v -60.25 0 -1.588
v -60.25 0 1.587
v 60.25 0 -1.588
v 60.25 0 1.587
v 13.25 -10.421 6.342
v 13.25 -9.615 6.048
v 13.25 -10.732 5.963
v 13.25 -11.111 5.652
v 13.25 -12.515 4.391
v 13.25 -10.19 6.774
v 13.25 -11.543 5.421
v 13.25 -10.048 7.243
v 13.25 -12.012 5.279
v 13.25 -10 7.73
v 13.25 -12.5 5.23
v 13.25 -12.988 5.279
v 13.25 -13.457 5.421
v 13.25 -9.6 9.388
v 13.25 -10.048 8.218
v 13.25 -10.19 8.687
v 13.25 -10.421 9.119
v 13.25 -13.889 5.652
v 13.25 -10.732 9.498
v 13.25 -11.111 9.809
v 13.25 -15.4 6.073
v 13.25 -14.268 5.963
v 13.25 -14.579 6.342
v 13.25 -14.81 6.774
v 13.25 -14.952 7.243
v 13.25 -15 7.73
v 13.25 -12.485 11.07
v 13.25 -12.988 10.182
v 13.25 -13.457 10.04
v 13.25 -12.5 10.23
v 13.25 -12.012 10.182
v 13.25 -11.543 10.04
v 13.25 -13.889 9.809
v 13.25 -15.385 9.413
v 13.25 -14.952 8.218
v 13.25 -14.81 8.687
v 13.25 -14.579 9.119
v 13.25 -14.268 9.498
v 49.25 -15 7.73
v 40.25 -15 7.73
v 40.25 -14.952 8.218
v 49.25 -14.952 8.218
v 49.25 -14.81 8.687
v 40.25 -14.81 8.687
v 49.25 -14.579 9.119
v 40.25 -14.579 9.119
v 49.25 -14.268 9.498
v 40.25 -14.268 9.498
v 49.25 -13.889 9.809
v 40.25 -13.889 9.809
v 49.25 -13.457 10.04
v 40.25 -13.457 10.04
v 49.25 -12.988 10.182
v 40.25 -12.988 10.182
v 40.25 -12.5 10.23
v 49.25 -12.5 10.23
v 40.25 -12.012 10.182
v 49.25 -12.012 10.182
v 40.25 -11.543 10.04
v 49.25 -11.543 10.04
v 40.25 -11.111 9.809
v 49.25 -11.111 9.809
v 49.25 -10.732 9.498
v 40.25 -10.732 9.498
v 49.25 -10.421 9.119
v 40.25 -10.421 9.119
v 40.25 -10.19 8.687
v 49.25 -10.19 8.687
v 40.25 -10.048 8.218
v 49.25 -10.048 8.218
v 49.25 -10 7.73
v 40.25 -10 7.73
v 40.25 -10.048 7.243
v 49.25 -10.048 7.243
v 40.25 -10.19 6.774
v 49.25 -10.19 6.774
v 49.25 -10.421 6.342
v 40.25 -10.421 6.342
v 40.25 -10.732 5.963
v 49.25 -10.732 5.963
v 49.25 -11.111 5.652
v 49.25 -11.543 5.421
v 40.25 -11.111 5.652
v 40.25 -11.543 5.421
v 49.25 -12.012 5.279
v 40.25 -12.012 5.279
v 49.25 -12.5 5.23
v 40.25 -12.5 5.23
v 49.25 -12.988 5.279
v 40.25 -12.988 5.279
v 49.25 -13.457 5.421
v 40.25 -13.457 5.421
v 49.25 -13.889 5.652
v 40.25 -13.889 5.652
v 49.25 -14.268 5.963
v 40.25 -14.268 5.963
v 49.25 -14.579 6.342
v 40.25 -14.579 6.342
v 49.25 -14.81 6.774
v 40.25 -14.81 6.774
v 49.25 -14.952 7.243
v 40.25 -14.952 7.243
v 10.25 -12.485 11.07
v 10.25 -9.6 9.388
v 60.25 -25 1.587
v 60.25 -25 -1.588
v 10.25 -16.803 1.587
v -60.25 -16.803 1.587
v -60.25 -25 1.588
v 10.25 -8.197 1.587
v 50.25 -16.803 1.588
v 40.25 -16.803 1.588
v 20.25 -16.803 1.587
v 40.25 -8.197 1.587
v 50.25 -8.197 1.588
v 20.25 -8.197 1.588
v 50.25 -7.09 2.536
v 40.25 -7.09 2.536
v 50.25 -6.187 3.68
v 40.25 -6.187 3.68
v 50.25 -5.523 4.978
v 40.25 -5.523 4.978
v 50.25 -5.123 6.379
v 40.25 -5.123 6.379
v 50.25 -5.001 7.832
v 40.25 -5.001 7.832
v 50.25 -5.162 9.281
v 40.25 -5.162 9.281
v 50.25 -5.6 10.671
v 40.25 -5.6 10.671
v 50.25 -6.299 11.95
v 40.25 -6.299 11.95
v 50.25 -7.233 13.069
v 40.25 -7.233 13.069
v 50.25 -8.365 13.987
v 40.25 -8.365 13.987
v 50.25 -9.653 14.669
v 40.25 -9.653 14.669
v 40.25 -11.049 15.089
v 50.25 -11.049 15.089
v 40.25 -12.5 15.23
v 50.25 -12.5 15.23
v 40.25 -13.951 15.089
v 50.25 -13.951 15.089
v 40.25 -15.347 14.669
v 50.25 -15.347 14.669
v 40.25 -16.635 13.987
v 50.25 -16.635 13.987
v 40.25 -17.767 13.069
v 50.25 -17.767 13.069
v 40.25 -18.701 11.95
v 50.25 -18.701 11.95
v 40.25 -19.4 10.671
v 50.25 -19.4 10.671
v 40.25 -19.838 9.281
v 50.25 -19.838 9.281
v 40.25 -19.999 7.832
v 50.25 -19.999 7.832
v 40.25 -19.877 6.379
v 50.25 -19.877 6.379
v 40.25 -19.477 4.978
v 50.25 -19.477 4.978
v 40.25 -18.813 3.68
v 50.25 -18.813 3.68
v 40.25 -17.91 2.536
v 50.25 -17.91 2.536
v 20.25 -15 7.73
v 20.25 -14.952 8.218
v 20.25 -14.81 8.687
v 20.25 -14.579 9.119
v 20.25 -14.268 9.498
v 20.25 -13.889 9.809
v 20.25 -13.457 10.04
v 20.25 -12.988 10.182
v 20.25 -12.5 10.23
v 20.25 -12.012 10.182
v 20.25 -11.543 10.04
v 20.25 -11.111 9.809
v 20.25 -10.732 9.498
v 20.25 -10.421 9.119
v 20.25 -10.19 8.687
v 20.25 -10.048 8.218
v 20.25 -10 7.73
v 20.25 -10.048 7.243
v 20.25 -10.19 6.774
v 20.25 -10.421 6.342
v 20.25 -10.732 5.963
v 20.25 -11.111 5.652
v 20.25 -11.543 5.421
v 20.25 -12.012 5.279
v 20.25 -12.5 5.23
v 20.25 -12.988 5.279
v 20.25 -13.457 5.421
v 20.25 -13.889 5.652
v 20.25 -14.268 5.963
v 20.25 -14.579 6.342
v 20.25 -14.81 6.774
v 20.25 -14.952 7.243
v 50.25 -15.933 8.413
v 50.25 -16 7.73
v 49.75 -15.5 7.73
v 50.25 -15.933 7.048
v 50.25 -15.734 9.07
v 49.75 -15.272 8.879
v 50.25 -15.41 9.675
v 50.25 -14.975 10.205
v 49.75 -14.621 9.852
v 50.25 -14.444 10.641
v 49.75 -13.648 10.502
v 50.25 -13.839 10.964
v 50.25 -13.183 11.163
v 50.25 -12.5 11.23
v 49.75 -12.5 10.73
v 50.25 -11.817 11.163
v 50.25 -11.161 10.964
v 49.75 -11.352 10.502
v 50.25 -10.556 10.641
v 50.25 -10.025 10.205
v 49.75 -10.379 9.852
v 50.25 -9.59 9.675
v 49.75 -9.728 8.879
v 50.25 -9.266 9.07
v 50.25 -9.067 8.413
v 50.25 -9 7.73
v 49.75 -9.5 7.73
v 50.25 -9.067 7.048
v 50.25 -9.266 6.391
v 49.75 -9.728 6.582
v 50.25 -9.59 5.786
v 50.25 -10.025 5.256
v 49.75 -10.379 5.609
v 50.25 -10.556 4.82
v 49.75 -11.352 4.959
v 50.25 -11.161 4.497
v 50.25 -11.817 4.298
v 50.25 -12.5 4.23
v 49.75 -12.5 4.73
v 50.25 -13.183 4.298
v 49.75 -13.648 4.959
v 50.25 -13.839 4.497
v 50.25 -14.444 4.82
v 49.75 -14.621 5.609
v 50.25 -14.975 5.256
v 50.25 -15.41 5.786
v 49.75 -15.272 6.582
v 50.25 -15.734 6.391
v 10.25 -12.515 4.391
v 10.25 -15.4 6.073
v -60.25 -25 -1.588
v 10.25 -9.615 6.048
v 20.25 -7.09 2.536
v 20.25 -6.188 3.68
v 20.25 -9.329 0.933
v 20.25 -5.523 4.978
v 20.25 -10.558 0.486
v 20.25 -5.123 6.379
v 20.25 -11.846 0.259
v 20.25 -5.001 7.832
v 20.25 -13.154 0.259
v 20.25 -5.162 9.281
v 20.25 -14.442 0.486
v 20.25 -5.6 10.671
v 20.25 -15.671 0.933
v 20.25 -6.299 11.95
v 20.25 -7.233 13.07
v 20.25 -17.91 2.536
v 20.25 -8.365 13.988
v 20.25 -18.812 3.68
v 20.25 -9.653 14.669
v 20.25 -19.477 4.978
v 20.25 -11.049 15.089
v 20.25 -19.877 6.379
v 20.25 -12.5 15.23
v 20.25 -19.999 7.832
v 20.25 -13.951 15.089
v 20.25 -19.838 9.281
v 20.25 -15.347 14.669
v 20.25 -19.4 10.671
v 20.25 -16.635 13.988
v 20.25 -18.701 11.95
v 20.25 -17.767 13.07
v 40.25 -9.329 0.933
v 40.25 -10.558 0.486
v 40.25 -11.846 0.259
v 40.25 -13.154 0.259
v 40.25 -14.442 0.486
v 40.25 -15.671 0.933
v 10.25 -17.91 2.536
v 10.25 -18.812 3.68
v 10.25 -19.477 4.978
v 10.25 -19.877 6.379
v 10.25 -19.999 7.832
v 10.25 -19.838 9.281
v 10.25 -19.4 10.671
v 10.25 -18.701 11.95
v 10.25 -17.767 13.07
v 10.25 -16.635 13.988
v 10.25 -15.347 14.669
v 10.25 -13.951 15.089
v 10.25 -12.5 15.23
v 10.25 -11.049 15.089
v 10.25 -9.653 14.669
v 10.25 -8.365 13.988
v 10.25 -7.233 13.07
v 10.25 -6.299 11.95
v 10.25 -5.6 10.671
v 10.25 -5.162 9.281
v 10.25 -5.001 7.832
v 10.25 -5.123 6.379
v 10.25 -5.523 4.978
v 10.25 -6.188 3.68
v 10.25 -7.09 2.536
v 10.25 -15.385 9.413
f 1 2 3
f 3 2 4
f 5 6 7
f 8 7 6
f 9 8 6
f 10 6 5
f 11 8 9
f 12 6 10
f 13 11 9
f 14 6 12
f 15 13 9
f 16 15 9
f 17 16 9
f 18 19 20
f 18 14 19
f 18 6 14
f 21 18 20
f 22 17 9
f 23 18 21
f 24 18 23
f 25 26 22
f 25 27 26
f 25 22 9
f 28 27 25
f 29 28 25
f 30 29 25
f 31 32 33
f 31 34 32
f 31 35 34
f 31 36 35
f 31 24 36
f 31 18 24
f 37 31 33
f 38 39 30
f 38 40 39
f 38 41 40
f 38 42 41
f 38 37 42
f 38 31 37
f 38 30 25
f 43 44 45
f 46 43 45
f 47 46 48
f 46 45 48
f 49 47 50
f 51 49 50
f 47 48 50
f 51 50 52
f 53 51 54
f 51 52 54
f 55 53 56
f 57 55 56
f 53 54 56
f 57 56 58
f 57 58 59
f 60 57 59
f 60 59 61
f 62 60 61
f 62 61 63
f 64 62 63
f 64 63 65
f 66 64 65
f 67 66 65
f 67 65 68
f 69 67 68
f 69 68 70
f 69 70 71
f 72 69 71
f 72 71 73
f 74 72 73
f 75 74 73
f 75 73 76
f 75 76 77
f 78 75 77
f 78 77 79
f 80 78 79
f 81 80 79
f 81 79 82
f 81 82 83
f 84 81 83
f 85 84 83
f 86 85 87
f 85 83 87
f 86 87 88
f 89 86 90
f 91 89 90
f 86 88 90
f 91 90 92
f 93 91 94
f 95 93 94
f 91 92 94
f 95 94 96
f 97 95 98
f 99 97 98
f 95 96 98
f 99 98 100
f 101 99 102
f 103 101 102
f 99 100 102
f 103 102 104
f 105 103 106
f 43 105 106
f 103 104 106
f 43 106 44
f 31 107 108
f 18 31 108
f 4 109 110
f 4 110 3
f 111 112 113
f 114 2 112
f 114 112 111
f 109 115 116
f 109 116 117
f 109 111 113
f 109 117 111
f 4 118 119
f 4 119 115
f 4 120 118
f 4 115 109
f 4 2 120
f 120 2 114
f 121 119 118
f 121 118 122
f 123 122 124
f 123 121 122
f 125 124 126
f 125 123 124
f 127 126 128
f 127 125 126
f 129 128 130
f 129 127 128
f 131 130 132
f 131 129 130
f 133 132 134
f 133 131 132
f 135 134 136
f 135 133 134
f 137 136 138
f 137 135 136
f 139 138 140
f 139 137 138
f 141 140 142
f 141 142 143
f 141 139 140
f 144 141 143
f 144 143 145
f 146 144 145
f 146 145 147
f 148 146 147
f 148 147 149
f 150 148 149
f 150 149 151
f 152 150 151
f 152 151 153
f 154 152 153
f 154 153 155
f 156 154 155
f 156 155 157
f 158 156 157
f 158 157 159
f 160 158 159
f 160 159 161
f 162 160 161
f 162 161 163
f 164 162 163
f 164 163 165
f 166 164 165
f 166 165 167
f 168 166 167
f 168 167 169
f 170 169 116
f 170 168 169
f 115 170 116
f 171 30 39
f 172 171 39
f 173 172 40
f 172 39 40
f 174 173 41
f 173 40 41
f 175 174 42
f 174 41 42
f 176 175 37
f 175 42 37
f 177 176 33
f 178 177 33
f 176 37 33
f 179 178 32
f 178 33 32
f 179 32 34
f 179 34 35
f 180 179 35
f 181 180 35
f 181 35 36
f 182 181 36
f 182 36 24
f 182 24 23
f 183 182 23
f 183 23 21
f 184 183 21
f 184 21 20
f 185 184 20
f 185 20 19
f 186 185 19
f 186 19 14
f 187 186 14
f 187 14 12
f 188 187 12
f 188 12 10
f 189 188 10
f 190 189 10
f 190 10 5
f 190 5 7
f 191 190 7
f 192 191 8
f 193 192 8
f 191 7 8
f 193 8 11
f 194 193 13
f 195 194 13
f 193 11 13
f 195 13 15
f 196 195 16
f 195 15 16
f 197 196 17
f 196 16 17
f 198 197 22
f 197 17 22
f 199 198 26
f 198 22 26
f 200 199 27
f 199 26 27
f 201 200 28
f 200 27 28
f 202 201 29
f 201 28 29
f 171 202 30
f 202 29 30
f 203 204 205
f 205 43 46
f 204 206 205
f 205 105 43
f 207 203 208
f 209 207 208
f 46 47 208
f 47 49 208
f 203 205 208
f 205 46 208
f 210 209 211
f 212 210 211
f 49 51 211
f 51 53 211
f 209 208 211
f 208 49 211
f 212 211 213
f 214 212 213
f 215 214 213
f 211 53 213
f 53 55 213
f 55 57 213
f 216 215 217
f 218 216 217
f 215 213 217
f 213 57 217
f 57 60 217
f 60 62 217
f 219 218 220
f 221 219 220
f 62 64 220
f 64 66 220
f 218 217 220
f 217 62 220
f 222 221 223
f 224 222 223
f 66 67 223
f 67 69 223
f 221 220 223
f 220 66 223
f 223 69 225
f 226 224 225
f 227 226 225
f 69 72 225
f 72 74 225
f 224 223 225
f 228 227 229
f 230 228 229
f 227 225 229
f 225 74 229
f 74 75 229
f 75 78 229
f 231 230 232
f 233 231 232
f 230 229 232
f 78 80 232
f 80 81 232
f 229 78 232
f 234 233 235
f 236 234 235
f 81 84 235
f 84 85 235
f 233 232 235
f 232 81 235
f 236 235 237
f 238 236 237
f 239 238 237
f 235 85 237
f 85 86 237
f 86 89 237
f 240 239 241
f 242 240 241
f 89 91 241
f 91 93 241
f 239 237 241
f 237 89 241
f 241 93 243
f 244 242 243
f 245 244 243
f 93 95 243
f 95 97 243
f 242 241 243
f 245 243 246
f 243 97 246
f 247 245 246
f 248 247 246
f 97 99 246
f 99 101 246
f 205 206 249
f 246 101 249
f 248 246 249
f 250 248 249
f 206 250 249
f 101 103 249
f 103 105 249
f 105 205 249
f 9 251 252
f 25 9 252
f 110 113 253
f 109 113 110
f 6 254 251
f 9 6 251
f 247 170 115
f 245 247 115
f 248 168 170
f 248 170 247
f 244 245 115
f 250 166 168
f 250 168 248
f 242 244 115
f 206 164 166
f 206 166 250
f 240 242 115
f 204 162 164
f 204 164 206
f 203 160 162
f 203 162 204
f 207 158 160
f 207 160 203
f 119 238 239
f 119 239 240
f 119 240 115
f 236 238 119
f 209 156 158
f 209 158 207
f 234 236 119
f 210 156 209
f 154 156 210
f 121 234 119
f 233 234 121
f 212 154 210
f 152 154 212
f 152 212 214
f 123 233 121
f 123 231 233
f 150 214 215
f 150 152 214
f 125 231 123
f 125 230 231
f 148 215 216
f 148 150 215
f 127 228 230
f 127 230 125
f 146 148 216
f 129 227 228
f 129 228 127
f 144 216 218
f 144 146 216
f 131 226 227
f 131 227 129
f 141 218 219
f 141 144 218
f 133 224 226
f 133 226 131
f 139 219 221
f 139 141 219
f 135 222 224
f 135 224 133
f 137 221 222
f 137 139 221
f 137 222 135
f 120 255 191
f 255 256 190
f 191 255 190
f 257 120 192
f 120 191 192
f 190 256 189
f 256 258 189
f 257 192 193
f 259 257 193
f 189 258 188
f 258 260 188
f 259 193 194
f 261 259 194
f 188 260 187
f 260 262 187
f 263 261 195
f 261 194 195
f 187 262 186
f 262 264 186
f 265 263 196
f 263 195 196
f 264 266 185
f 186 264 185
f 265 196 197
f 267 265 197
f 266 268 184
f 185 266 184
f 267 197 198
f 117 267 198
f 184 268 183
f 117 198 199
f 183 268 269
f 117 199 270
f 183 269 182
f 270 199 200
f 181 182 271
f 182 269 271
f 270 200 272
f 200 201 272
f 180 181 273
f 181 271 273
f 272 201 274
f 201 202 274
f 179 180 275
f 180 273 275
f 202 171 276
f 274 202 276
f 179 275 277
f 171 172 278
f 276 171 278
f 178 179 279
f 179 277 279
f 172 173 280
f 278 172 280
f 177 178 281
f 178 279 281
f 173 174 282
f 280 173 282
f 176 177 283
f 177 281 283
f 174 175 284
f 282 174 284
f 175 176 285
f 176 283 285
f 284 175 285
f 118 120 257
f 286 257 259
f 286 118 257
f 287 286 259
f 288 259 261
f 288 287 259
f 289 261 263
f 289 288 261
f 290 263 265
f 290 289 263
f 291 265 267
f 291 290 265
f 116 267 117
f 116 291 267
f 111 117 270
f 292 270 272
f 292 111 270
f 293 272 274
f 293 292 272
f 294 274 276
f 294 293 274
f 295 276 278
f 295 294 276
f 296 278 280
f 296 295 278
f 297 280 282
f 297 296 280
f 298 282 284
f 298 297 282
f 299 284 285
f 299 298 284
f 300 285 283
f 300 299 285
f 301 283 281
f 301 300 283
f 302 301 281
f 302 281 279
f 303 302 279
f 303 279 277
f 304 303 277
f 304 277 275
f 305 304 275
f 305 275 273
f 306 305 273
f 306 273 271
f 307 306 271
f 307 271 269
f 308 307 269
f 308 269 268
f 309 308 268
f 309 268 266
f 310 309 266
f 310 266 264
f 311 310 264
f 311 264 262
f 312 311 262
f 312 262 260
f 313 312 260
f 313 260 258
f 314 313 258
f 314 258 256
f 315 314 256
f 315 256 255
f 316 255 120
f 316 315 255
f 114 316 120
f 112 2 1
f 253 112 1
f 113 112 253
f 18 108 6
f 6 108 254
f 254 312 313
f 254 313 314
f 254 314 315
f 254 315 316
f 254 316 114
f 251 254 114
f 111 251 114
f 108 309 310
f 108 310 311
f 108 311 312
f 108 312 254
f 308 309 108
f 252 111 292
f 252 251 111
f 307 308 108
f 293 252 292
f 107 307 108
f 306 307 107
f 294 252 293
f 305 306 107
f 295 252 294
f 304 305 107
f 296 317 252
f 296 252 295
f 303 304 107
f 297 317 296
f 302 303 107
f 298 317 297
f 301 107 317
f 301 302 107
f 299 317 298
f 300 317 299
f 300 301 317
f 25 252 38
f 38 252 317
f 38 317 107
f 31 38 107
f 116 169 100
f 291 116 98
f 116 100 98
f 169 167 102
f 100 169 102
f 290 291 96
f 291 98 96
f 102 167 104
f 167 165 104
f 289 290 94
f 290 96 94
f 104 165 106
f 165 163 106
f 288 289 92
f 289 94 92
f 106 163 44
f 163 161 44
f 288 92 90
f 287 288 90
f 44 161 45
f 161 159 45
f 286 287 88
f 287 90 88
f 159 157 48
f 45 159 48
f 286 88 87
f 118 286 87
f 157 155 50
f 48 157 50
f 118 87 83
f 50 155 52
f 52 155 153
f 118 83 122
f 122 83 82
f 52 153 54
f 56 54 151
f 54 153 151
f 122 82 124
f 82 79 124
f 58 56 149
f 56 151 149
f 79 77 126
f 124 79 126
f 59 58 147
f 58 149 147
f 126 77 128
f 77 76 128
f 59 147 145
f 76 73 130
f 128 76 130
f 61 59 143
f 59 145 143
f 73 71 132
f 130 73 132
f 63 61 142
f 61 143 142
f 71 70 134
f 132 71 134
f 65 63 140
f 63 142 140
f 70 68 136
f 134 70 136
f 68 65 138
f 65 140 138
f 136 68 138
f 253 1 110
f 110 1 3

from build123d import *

# Parameters (mm, degrees)
F0_W      = 120.5
F0_H      = 3.175
F1_DEPTH  = 25
F2_R      = 7.5
F3_DEPTH  = 20
F4_R      = 7.5
F5_DEPTH  = 20
F6_R      = 7.5
F7_DEPTH  = 80.5
F8_W      = 26.1427015066
F8_H      = 14.1189814121
F9_DEPTH  = 70.5
F10_W     = 25
F10_H     = 14.862489751
F11_DEPTH = 10
F12_R     = 2.5
F13_DEPTH = 80
F15_DEPTH = 3
F16_SIZE  = 1


# Not quite as in the source:
# - a feature names something its author has since deleted; it is built from what else it names


with BuildPart() as f1:
    # F0 (on Front) → F1 (new body)
    with BuildSketch(Plane.XZ):
        Rectangle(F0_W, F0_H)
    extrude(amount=F1_DEPTH)

    # F2 (on face) → F3 (join)
    with BuildSketch(Plane.YZ.offset(60.25)):
        with Locations((-12.5, 7.7303019352)):
            Circle(F2_R)
    extrude(amount=-F3_DEPTH)

    # F4 (on face) → F5 (cut)
    with BuildSketch(Plane(origin=(40.25, 0, 0), x_dir=(0, -1, 0), z_dir=(-1, 0, 0))):
        with Locations((12.5, 7.7303019352)):
            Circle(F4_R)
    extrude(amount=F5_DEPTH, mode=Mode.SUBTRACT)

    # F6 (on face) → F7 (join)
    with BuildSketch(Plane(origin=(-60.25, 0, 0), x_dir=(0, -1, 0), z_dir=(-1, 0, 0))):
        with Locations((12.5, 7.7305)):
            Circle(F6_R)
    extrude(amount=-F7_DEPTH)

    # F8 (on face) → F9 (cut)
    with BuildSketch(Plane(origin=(-60.25, 0, 0), x_dir=(0, -1, 0), z_dir=(-1, 0, 0))):
        with Locations((13.0713507533, 8.646990706)):
            Rectangle(F8_W, F8_H)
    extrude(amount=-F9_DEPTH, mode=Mode.SUBTRACT)

    # F10 (on face) → F11 (cut)
    with BuildSketch(Plane.YZ.offset(60.25)):
        with Locations((-12.5, 9.0187448755)):
            Rectangle(F10_W, F10_H)
    extrude(amount=-F11_DEPTH, mode=Mode.SUBTRACT)

    # F12 (on face) → F13 (cut)
    with BuildSketch(Plane(origin=(10.25, 0, 0), x_dir=(0, -1, 0), z_dir=(-1, 0, 0))):
        with Locations((12.5, 7.7305)):
            Circle(F12_R)
    extrude(amount=-F13_DEPTH, mode=Mode.SUBTRACT)

    # F14 (on face) → F15 (cut)
    with BuildSketch(Plane(origin=(10.25, 0, 0), x_dir=(0, -1, 0), z_dir=(-1, 0, 0))):
        Polygon((12.5147298399, 4.3905242768), (15.3998687443, 6.0732685539), (15.3851389044, 9.4132442772), (12.4852701601, 11.0704757232), (9.6001312557, 9.3877314461), (9.6148610956, 6.0477557228), align=None)
    extrude(amount=-F15_DEPTH, mode=Mode.SUBTRACT)

    # F16
    f16_edges = [f1.edges().sort_by_distance(p)[0] for p in [
        (50.25, -10, 7.7305),
    ]]
    chamfer(f16_edges, length=F16_SIZE)


solid = f1.part
